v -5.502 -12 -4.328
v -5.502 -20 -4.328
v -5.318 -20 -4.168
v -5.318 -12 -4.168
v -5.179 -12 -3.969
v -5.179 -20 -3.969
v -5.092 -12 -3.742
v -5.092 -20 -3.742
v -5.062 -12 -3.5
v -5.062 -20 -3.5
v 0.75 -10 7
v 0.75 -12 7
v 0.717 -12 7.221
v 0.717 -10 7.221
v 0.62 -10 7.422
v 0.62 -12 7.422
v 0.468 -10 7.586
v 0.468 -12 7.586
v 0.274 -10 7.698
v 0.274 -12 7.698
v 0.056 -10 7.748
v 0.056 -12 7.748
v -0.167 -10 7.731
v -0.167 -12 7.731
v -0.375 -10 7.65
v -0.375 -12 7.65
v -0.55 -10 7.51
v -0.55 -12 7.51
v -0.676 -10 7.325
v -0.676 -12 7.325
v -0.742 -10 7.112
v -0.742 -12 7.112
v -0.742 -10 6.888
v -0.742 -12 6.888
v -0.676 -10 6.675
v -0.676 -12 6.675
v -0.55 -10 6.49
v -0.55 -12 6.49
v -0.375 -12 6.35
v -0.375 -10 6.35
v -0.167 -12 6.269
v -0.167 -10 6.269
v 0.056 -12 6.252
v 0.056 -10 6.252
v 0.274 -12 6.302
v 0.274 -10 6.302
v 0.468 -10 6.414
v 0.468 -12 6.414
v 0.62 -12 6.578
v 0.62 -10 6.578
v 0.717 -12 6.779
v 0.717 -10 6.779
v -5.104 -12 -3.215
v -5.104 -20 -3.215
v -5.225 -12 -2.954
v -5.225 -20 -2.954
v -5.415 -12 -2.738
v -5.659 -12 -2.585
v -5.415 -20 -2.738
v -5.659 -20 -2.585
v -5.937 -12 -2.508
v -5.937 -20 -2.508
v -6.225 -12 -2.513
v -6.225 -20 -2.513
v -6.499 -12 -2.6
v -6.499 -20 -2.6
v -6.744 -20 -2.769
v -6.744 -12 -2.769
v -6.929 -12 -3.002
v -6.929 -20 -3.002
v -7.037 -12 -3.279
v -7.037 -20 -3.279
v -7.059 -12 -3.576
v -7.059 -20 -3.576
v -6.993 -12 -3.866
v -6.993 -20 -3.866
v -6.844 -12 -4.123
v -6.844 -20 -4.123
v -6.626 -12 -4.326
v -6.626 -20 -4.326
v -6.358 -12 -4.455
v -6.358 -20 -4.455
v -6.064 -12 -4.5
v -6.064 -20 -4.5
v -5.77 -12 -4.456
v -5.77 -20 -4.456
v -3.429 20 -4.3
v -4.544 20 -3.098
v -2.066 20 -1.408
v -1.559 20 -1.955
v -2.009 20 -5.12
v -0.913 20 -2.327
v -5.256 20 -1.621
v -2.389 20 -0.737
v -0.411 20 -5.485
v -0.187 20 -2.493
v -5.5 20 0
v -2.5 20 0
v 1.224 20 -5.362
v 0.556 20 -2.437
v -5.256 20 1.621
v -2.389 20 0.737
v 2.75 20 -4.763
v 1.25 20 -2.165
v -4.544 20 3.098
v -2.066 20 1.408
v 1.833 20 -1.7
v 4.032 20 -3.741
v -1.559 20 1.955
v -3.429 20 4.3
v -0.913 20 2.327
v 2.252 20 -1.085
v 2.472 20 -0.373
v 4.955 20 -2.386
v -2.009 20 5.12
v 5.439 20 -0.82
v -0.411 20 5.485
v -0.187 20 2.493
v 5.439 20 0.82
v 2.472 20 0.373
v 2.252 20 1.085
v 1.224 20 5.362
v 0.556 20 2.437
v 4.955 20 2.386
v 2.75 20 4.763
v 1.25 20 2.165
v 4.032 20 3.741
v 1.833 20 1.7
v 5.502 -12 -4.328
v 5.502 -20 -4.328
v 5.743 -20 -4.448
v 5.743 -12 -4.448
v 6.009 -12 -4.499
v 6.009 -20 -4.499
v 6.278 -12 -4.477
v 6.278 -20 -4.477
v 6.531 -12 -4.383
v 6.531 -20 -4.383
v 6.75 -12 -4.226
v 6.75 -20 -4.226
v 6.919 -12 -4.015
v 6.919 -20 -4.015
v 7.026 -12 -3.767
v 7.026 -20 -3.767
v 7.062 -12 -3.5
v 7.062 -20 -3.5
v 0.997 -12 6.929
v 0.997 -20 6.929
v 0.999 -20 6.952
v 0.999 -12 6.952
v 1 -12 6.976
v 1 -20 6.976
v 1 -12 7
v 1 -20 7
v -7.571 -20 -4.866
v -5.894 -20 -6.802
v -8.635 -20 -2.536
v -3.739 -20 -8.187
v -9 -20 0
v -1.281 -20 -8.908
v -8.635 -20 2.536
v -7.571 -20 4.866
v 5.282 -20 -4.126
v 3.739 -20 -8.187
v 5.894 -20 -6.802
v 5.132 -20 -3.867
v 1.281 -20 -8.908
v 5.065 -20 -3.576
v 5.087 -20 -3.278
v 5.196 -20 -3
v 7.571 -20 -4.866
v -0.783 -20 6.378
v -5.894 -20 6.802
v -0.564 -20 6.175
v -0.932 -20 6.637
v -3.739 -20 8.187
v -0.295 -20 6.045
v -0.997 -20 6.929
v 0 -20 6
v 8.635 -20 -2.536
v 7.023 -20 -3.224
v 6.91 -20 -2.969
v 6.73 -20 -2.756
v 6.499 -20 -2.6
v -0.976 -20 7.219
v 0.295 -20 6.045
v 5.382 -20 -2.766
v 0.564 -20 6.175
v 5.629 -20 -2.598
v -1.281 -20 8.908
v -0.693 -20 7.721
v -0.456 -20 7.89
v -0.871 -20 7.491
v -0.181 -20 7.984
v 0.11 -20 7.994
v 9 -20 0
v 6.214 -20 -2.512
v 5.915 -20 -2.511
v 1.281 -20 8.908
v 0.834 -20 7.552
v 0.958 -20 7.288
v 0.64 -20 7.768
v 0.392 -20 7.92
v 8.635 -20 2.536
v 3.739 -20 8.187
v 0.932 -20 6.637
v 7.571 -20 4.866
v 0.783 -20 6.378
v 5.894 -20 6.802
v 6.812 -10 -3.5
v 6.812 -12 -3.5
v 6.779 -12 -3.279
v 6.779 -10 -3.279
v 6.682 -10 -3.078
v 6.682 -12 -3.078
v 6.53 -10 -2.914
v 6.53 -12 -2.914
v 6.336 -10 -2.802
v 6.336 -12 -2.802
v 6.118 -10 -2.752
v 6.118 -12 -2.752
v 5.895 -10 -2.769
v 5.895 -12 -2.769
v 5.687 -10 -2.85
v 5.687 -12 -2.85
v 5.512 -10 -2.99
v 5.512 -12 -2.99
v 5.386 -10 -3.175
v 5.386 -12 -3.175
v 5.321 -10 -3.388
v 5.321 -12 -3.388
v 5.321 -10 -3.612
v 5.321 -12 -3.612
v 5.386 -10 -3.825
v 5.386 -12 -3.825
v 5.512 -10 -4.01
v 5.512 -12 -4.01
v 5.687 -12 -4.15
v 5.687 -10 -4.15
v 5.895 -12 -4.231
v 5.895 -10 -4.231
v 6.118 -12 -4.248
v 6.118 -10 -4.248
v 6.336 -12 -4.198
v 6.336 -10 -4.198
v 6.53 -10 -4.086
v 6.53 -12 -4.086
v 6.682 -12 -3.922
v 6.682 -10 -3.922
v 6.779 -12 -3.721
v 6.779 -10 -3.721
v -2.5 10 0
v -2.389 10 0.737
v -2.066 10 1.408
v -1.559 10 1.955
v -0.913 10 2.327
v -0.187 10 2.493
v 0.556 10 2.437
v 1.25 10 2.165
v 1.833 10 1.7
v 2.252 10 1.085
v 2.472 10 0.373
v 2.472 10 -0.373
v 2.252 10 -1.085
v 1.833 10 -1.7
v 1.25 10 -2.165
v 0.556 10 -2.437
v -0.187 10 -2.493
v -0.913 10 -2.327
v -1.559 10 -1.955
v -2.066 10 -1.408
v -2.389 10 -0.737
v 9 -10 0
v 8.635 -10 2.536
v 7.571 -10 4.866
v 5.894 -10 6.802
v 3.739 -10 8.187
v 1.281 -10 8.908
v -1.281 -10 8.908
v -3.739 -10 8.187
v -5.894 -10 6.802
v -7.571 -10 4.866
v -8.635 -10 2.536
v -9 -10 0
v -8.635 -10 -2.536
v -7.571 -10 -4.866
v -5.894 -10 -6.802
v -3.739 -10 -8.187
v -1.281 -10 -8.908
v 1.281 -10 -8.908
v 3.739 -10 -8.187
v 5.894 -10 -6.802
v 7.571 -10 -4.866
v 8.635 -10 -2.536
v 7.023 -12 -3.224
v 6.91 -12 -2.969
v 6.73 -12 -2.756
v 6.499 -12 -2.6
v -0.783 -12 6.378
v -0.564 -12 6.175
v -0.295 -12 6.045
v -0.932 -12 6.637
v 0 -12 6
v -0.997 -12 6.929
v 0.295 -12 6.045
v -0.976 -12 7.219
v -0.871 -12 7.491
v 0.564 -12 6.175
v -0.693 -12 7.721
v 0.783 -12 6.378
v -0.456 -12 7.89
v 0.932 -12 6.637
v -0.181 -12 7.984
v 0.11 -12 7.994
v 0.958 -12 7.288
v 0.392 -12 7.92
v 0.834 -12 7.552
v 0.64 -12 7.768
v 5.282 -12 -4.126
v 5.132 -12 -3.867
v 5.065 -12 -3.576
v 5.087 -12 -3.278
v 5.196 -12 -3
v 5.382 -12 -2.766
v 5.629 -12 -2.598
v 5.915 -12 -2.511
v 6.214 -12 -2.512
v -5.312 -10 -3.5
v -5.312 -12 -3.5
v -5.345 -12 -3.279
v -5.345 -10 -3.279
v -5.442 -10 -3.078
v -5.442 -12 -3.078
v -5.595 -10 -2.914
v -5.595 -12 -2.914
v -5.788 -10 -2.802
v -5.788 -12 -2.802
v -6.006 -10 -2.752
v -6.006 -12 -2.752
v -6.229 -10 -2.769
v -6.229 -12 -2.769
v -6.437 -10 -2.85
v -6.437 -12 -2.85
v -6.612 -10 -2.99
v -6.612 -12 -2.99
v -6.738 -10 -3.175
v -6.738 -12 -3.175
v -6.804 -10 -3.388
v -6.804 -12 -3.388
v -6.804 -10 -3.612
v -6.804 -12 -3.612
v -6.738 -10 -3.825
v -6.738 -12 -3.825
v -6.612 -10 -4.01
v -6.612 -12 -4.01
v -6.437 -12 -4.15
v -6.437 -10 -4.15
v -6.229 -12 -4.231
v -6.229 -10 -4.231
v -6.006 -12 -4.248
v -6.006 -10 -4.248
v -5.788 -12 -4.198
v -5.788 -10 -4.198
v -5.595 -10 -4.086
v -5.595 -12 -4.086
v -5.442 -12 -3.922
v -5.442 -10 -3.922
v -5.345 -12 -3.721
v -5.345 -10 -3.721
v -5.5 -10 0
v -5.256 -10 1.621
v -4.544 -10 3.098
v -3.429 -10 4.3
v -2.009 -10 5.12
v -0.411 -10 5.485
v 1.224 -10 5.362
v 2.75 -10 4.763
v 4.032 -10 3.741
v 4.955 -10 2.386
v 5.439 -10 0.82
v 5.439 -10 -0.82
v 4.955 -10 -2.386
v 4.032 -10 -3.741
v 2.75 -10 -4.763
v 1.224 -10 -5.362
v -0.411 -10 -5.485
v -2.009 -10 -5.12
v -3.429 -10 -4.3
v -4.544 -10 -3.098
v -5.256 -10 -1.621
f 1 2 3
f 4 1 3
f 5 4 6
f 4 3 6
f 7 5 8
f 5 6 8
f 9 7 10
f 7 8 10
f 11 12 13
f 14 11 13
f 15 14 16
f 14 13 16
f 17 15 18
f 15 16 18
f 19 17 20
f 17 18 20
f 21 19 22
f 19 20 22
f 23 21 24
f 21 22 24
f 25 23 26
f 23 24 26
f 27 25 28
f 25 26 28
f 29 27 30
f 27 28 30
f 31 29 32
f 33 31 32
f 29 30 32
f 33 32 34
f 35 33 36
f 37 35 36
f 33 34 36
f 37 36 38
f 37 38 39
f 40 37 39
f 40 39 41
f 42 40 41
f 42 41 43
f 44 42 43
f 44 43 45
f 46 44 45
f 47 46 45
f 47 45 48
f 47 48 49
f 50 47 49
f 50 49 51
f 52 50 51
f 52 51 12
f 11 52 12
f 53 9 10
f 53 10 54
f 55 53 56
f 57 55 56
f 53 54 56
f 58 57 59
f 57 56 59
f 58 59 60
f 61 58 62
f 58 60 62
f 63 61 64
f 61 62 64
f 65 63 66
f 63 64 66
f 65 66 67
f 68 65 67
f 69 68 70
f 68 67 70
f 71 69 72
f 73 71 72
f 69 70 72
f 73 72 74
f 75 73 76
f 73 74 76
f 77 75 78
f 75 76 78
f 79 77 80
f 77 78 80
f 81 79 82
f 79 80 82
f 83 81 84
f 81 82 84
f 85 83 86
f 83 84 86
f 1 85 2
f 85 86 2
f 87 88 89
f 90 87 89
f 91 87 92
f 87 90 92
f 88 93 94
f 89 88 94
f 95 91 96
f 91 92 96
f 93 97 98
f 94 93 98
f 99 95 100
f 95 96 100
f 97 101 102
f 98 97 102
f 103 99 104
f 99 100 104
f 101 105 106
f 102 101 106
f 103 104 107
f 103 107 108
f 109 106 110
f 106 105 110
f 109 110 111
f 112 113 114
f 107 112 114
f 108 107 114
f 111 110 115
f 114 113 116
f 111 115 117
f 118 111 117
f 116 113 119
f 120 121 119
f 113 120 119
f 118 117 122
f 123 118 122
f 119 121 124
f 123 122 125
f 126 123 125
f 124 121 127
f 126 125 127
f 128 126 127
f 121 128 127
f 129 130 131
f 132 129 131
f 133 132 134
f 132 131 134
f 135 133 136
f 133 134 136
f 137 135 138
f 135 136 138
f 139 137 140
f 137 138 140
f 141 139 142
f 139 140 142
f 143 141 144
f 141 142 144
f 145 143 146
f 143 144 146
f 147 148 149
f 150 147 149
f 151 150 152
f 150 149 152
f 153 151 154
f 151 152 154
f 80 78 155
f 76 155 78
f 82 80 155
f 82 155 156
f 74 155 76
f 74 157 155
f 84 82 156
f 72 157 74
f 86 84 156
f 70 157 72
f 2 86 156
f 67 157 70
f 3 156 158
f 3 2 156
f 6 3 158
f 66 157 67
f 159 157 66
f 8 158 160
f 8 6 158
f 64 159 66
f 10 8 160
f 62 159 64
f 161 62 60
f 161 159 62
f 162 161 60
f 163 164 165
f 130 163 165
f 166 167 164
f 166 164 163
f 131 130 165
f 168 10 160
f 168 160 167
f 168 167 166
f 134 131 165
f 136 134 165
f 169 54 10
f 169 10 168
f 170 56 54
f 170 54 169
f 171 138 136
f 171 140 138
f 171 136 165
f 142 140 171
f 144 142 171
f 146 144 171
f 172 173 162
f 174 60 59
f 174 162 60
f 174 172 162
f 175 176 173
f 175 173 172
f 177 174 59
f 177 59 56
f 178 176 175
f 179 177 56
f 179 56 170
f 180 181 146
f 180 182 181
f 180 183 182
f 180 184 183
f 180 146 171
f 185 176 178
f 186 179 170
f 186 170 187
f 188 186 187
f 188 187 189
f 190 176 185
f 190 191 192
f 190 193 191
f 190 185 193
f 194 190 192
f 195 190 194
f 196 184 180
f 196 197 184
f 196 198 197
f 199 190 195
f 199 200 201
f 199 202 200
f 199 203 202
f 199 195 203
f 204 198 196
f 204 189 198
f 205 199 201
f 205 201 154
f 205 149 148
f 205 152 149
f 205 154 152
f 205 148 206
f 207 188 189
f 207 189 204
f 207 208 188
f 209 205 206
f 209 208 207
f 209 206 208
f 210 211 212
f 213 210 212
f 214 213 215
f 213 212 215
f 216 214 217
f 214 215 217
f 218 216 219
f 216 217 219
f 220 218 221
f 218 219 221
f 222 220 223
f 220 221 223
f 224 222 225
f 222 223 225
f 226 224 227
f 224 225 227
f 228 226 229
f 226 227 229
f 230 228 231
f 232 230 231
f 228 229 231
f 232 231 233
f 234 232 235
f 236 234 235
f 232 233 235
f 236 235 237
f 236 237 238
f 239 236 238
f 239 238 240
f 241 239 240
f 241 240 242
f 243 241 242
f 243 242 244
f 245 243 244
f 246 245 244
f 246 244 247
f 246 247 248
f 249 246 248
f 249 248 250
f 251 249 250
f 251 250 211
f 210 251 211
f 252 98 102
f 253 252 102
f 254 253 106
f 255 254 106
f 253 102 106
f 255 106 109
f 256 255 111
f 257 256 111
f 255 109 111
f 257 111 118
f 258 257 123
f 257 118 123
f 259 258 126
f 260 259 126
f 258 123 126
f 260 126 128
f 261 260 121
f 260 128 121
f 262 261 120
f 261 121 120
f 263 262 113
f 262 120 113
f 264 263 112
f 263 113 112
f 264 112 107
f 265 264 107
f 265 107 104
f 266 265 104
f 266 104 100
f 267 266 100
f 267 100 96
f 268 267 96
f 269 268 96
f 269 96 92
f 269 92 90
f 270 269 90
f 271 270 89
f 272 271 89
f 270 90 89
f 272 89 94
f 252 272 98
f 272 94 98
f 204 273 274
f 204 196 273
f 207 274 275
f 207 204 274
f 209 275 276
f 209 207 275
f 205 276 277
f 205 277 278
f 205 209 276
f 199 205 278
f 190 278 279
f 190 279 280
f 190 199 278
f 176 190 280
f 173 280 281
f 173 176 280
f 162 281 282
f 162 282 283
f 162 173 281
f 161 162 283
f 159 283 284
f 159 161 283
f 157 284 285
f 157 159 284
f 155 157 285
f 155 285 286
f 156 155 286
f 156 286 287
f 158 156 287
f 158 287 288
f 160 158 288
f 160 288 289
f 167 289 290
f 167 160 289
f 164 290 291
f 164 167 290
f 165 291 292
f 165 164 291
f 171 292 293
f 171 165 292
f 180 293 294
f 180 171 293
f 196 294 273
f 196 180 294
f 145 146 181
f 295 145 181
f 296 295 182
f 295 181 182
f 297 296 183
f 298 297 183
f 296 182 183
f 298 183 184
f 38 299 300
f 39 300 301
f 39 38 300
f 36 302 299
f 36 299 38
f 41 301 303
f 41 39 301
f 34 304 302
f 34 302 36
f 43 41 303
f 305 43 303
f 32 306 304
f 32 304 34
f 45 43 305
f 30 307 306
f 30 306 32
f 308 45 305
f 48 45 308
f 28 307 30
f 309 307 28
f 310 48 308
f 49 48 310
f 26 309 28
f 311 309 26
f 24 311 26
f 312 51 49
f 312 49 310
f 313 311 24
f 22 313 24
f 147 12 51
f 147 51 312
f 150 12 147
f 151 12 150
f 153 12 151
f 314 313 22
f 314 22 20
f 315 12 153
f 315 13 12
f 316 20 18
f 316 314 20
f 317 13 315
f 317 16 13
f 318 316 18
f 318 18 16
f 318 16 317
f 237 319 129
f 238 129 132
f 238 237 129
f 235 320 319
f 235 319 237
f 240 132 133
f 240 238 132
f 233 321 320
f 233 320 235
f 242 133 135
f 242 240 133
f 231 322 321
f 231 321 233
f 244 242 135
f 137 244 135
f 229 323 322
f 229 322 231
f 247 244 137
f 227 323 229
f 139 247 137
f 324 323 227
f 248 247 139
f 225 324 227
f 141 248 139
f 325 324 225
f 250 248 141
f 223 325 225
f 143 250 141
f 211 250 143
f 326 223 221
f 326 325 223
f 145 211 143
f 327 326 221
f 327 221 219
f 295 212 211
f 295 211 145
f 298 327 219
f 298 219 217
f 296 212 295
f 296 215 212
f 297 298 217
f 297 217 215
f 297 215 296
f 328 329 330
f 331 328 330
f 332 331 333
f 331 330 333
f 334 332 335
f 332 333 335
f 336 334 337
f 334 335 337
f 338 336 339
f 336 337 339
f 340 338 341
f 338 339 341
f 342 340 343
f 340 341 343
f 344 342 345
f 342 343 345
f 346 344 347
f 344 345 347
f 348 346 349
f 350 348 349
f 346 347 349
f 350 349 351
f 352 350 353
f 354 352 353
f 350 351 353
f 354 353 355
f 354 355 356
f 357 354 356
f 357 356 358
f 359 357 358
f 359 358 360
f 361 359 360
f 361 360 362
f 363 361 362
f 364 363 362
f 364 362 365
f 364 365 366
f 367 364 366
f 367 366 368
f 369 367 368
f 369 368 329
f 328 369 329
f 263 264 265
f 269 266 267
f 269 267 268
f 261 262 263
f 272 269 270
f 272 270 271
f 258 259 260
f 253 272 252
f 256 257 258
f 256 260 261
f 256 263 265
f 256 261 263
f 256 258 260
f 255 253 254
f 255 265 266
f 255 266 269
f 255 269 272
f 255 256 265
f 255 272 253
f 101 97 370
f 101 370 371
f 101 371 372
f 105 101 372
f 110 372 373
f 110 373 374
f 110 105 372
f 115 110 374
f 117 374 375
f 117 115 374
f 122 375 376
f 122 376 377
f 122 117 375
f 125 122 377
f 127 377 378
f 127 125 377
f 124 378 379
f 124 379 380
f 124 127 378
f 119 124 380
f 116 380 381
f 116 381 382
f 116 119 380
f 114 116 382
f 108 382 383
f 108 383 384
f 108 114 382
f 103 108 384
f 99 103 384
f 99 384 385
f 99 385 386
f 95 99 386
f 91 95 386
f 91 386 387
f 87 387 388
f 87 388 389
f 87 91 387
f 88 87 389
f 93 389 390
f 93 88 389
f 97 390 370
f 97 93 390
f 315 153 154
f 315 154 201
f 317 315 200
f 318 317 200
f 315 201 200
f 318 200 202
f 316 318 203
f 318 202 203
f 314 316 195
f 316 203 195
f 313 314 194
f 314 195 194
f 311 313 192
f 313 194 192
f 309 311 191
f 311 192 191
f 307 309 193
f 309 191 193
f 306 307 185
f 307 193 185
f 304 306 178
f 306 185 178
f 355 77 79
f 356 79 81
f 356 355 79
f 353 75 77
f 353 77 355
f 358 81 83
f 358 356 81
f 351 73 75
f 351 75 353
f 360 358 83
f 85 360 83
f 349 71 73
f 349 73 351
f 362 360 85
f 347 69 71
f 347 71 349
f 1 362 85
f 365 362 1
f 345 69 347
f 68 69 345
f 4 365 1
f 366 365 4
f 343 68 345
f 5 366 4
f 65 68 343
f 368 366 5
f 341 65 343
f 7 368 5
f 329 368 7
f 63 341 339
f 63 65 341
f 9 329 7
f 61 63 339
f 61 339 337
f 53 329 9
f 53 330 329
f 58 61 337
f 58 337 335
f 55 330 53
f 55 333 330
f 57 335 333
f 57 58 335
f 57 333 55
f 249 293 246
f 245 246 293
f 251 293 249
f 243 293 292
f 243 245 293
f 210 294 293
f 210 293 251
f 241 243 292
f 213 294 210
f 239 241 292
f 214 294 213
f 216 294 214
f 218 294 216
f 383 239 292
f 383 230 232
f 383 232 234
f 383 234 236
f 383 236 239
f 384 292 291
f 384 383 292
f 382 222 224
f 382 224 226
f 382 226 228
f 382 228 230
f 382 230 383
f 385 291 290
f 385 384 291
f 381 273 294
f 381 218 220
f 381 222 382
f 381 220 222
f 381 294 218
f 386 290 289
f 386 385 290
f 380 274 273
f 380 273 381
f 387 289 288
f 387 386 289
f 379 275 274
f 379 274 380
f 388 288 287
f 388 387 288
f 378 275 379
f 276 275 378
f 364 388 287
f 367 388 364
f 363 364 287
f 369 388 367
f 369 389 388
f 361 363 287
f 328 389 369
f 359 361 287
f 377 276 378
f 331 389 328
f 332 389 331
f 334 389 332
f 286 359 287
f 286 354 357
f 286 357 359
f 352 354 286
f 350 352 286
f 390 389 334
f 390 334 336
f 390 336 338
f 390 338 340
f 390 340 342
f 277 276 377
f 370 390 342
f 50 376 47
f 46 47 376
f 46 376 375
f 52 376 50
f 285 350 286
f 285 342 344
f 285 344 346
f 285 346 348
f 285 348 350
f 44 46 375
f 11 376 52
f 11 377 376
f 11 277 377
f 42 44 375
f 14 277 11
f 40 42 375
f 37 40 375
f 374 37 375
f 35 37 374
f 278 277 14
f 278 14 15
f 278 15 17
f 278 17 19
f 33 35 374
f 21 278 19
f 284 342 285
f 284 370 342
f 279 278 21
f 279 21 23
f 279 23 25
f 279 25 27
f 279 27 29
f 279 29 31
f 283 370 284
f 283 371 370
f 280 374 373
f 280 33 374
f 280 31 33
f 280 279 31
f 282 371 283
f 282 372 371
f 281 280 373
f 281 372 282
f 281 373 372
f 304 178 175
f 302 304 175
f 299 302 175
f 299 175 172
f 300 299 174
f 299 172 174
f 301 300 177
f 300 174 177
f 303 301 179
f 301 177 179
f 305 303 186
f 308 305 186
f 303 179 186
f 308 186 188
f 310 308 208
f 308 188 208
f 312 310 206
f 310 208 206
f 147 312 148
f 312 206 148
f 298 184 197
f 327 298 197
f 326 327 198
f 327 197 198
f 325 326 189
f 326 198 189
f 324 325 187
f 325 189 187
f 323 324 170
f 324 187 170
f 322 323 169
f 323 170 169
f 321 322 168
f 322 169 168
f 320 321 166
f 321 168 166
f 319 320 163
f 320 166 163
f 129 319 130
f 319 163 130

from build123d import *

# Parameters (mm, degrees)
F0_R     = 9
F1_DEPTH = 20
F2_R     = 0.75
F3_DEPTH = 8
F4_R     = 9
F4_R_2   = 5.5
F5_DEPTH = 30
F6_DEPTH = 10
F7_R     = 2.5
F8_DEPTH = 10


with BuildPart() as f1:
    # F0 (on Front) → F1 (new body, symmetric)
    with BuildSketch(Plane.XZ):
        Circle(F0_R)
    extrude(amount=F1_DEPTH, both=True)

    # F2 (on face) → F3 (cut)
    with BuildSketch(Plane.XZ.offset(20)):
        with BuildLine():
            ThreePointArc((1, 7), (-0.035737, 7.999361), (-0.997446, 6.928571))
            ThreePointArc((-0.997446, 6.928571), (0, 6), (0.997446, 6.928571))
            ThreePointArc((0.997446, 6.928571), (0.999361, 6.964263), (1, 7))
        make_face()
        with Locations((0, 7)):
            Circle(F2_R, mode=Mode.SUBTRACT)
        with BuildLine():
            ThreePointArc((-5.062178, -3.5), (-5.531548, -2.652396), (-6.499042, -2.600472))
            ThreePointArc((-6.499042, -2.600472), (-6.928203, -4), (-5.501596, -4.328099))
            ThreePointArc((-5.501596, -4.328099), (-5.178837, -3.968731), (-5.062178, -3.5))
        make_face()
        with Locations((-6.062178, -3.5)):
            Circle(F2_R, mode=Mode.SUBTRACT)
        with BuildLine():
            ThreePointArc((7.062178, -3.5), (6.909781, -2.96937), (6.499042, -2.600472))
            ThreePointArc((6.499042, -2.600472), (5.196152, -3), (5.501596, -4.328099))
            ThreePointArc((5.501596, -4.328099), (6.530909, -4.383341), (7.062178, -3.5))
        make_face()
        with Locations((6.062178, -3.5)):
            Circle(F2_R, mode=Mode.SUBTRACT)
    extrude(amount=-F3_DEPTH, mode=Mode.SUBTRACT)

    # F4 (on face) → F5 (cut)
    with BuildSketch(Plane(origin=(0, 20, 0), x_dir=(-1, 0, 0), z_dir=(0, 1, 0))):
        Circle(F4_R)
        Circle(F4_R_2, mode=Mode.SUBTRACT)
    extrude(amount=-F5_DEPTH, mode=Mode.SUBTRACT)

    # F2 (on face) → F6 (cut)
    with BuildSketch(Plane.XZ.offset(20)):
        with Locations((-6.062178, -3.5)):
            Circle(F2_R)
        with Locations((0, 7)):
            Circle(F2_R)
        with Locations((6.062178, -3.5)):
            Circle(F2_R)
    extrude(amount=-F6_DEPTH, mode=Mode.SUBTRACT)

    # F7 (on face) → F8 (cut)
    with BuildSketch(Plane(origin=(0, 20, 0), x_dir=(-1, 0, 0), z_dir=(0, 1, 0))):
        Circle(F7_R)
    extrude(amount=-F8_DEPTH, mode=Mode.SUBTRACT)


solid = f1.part
